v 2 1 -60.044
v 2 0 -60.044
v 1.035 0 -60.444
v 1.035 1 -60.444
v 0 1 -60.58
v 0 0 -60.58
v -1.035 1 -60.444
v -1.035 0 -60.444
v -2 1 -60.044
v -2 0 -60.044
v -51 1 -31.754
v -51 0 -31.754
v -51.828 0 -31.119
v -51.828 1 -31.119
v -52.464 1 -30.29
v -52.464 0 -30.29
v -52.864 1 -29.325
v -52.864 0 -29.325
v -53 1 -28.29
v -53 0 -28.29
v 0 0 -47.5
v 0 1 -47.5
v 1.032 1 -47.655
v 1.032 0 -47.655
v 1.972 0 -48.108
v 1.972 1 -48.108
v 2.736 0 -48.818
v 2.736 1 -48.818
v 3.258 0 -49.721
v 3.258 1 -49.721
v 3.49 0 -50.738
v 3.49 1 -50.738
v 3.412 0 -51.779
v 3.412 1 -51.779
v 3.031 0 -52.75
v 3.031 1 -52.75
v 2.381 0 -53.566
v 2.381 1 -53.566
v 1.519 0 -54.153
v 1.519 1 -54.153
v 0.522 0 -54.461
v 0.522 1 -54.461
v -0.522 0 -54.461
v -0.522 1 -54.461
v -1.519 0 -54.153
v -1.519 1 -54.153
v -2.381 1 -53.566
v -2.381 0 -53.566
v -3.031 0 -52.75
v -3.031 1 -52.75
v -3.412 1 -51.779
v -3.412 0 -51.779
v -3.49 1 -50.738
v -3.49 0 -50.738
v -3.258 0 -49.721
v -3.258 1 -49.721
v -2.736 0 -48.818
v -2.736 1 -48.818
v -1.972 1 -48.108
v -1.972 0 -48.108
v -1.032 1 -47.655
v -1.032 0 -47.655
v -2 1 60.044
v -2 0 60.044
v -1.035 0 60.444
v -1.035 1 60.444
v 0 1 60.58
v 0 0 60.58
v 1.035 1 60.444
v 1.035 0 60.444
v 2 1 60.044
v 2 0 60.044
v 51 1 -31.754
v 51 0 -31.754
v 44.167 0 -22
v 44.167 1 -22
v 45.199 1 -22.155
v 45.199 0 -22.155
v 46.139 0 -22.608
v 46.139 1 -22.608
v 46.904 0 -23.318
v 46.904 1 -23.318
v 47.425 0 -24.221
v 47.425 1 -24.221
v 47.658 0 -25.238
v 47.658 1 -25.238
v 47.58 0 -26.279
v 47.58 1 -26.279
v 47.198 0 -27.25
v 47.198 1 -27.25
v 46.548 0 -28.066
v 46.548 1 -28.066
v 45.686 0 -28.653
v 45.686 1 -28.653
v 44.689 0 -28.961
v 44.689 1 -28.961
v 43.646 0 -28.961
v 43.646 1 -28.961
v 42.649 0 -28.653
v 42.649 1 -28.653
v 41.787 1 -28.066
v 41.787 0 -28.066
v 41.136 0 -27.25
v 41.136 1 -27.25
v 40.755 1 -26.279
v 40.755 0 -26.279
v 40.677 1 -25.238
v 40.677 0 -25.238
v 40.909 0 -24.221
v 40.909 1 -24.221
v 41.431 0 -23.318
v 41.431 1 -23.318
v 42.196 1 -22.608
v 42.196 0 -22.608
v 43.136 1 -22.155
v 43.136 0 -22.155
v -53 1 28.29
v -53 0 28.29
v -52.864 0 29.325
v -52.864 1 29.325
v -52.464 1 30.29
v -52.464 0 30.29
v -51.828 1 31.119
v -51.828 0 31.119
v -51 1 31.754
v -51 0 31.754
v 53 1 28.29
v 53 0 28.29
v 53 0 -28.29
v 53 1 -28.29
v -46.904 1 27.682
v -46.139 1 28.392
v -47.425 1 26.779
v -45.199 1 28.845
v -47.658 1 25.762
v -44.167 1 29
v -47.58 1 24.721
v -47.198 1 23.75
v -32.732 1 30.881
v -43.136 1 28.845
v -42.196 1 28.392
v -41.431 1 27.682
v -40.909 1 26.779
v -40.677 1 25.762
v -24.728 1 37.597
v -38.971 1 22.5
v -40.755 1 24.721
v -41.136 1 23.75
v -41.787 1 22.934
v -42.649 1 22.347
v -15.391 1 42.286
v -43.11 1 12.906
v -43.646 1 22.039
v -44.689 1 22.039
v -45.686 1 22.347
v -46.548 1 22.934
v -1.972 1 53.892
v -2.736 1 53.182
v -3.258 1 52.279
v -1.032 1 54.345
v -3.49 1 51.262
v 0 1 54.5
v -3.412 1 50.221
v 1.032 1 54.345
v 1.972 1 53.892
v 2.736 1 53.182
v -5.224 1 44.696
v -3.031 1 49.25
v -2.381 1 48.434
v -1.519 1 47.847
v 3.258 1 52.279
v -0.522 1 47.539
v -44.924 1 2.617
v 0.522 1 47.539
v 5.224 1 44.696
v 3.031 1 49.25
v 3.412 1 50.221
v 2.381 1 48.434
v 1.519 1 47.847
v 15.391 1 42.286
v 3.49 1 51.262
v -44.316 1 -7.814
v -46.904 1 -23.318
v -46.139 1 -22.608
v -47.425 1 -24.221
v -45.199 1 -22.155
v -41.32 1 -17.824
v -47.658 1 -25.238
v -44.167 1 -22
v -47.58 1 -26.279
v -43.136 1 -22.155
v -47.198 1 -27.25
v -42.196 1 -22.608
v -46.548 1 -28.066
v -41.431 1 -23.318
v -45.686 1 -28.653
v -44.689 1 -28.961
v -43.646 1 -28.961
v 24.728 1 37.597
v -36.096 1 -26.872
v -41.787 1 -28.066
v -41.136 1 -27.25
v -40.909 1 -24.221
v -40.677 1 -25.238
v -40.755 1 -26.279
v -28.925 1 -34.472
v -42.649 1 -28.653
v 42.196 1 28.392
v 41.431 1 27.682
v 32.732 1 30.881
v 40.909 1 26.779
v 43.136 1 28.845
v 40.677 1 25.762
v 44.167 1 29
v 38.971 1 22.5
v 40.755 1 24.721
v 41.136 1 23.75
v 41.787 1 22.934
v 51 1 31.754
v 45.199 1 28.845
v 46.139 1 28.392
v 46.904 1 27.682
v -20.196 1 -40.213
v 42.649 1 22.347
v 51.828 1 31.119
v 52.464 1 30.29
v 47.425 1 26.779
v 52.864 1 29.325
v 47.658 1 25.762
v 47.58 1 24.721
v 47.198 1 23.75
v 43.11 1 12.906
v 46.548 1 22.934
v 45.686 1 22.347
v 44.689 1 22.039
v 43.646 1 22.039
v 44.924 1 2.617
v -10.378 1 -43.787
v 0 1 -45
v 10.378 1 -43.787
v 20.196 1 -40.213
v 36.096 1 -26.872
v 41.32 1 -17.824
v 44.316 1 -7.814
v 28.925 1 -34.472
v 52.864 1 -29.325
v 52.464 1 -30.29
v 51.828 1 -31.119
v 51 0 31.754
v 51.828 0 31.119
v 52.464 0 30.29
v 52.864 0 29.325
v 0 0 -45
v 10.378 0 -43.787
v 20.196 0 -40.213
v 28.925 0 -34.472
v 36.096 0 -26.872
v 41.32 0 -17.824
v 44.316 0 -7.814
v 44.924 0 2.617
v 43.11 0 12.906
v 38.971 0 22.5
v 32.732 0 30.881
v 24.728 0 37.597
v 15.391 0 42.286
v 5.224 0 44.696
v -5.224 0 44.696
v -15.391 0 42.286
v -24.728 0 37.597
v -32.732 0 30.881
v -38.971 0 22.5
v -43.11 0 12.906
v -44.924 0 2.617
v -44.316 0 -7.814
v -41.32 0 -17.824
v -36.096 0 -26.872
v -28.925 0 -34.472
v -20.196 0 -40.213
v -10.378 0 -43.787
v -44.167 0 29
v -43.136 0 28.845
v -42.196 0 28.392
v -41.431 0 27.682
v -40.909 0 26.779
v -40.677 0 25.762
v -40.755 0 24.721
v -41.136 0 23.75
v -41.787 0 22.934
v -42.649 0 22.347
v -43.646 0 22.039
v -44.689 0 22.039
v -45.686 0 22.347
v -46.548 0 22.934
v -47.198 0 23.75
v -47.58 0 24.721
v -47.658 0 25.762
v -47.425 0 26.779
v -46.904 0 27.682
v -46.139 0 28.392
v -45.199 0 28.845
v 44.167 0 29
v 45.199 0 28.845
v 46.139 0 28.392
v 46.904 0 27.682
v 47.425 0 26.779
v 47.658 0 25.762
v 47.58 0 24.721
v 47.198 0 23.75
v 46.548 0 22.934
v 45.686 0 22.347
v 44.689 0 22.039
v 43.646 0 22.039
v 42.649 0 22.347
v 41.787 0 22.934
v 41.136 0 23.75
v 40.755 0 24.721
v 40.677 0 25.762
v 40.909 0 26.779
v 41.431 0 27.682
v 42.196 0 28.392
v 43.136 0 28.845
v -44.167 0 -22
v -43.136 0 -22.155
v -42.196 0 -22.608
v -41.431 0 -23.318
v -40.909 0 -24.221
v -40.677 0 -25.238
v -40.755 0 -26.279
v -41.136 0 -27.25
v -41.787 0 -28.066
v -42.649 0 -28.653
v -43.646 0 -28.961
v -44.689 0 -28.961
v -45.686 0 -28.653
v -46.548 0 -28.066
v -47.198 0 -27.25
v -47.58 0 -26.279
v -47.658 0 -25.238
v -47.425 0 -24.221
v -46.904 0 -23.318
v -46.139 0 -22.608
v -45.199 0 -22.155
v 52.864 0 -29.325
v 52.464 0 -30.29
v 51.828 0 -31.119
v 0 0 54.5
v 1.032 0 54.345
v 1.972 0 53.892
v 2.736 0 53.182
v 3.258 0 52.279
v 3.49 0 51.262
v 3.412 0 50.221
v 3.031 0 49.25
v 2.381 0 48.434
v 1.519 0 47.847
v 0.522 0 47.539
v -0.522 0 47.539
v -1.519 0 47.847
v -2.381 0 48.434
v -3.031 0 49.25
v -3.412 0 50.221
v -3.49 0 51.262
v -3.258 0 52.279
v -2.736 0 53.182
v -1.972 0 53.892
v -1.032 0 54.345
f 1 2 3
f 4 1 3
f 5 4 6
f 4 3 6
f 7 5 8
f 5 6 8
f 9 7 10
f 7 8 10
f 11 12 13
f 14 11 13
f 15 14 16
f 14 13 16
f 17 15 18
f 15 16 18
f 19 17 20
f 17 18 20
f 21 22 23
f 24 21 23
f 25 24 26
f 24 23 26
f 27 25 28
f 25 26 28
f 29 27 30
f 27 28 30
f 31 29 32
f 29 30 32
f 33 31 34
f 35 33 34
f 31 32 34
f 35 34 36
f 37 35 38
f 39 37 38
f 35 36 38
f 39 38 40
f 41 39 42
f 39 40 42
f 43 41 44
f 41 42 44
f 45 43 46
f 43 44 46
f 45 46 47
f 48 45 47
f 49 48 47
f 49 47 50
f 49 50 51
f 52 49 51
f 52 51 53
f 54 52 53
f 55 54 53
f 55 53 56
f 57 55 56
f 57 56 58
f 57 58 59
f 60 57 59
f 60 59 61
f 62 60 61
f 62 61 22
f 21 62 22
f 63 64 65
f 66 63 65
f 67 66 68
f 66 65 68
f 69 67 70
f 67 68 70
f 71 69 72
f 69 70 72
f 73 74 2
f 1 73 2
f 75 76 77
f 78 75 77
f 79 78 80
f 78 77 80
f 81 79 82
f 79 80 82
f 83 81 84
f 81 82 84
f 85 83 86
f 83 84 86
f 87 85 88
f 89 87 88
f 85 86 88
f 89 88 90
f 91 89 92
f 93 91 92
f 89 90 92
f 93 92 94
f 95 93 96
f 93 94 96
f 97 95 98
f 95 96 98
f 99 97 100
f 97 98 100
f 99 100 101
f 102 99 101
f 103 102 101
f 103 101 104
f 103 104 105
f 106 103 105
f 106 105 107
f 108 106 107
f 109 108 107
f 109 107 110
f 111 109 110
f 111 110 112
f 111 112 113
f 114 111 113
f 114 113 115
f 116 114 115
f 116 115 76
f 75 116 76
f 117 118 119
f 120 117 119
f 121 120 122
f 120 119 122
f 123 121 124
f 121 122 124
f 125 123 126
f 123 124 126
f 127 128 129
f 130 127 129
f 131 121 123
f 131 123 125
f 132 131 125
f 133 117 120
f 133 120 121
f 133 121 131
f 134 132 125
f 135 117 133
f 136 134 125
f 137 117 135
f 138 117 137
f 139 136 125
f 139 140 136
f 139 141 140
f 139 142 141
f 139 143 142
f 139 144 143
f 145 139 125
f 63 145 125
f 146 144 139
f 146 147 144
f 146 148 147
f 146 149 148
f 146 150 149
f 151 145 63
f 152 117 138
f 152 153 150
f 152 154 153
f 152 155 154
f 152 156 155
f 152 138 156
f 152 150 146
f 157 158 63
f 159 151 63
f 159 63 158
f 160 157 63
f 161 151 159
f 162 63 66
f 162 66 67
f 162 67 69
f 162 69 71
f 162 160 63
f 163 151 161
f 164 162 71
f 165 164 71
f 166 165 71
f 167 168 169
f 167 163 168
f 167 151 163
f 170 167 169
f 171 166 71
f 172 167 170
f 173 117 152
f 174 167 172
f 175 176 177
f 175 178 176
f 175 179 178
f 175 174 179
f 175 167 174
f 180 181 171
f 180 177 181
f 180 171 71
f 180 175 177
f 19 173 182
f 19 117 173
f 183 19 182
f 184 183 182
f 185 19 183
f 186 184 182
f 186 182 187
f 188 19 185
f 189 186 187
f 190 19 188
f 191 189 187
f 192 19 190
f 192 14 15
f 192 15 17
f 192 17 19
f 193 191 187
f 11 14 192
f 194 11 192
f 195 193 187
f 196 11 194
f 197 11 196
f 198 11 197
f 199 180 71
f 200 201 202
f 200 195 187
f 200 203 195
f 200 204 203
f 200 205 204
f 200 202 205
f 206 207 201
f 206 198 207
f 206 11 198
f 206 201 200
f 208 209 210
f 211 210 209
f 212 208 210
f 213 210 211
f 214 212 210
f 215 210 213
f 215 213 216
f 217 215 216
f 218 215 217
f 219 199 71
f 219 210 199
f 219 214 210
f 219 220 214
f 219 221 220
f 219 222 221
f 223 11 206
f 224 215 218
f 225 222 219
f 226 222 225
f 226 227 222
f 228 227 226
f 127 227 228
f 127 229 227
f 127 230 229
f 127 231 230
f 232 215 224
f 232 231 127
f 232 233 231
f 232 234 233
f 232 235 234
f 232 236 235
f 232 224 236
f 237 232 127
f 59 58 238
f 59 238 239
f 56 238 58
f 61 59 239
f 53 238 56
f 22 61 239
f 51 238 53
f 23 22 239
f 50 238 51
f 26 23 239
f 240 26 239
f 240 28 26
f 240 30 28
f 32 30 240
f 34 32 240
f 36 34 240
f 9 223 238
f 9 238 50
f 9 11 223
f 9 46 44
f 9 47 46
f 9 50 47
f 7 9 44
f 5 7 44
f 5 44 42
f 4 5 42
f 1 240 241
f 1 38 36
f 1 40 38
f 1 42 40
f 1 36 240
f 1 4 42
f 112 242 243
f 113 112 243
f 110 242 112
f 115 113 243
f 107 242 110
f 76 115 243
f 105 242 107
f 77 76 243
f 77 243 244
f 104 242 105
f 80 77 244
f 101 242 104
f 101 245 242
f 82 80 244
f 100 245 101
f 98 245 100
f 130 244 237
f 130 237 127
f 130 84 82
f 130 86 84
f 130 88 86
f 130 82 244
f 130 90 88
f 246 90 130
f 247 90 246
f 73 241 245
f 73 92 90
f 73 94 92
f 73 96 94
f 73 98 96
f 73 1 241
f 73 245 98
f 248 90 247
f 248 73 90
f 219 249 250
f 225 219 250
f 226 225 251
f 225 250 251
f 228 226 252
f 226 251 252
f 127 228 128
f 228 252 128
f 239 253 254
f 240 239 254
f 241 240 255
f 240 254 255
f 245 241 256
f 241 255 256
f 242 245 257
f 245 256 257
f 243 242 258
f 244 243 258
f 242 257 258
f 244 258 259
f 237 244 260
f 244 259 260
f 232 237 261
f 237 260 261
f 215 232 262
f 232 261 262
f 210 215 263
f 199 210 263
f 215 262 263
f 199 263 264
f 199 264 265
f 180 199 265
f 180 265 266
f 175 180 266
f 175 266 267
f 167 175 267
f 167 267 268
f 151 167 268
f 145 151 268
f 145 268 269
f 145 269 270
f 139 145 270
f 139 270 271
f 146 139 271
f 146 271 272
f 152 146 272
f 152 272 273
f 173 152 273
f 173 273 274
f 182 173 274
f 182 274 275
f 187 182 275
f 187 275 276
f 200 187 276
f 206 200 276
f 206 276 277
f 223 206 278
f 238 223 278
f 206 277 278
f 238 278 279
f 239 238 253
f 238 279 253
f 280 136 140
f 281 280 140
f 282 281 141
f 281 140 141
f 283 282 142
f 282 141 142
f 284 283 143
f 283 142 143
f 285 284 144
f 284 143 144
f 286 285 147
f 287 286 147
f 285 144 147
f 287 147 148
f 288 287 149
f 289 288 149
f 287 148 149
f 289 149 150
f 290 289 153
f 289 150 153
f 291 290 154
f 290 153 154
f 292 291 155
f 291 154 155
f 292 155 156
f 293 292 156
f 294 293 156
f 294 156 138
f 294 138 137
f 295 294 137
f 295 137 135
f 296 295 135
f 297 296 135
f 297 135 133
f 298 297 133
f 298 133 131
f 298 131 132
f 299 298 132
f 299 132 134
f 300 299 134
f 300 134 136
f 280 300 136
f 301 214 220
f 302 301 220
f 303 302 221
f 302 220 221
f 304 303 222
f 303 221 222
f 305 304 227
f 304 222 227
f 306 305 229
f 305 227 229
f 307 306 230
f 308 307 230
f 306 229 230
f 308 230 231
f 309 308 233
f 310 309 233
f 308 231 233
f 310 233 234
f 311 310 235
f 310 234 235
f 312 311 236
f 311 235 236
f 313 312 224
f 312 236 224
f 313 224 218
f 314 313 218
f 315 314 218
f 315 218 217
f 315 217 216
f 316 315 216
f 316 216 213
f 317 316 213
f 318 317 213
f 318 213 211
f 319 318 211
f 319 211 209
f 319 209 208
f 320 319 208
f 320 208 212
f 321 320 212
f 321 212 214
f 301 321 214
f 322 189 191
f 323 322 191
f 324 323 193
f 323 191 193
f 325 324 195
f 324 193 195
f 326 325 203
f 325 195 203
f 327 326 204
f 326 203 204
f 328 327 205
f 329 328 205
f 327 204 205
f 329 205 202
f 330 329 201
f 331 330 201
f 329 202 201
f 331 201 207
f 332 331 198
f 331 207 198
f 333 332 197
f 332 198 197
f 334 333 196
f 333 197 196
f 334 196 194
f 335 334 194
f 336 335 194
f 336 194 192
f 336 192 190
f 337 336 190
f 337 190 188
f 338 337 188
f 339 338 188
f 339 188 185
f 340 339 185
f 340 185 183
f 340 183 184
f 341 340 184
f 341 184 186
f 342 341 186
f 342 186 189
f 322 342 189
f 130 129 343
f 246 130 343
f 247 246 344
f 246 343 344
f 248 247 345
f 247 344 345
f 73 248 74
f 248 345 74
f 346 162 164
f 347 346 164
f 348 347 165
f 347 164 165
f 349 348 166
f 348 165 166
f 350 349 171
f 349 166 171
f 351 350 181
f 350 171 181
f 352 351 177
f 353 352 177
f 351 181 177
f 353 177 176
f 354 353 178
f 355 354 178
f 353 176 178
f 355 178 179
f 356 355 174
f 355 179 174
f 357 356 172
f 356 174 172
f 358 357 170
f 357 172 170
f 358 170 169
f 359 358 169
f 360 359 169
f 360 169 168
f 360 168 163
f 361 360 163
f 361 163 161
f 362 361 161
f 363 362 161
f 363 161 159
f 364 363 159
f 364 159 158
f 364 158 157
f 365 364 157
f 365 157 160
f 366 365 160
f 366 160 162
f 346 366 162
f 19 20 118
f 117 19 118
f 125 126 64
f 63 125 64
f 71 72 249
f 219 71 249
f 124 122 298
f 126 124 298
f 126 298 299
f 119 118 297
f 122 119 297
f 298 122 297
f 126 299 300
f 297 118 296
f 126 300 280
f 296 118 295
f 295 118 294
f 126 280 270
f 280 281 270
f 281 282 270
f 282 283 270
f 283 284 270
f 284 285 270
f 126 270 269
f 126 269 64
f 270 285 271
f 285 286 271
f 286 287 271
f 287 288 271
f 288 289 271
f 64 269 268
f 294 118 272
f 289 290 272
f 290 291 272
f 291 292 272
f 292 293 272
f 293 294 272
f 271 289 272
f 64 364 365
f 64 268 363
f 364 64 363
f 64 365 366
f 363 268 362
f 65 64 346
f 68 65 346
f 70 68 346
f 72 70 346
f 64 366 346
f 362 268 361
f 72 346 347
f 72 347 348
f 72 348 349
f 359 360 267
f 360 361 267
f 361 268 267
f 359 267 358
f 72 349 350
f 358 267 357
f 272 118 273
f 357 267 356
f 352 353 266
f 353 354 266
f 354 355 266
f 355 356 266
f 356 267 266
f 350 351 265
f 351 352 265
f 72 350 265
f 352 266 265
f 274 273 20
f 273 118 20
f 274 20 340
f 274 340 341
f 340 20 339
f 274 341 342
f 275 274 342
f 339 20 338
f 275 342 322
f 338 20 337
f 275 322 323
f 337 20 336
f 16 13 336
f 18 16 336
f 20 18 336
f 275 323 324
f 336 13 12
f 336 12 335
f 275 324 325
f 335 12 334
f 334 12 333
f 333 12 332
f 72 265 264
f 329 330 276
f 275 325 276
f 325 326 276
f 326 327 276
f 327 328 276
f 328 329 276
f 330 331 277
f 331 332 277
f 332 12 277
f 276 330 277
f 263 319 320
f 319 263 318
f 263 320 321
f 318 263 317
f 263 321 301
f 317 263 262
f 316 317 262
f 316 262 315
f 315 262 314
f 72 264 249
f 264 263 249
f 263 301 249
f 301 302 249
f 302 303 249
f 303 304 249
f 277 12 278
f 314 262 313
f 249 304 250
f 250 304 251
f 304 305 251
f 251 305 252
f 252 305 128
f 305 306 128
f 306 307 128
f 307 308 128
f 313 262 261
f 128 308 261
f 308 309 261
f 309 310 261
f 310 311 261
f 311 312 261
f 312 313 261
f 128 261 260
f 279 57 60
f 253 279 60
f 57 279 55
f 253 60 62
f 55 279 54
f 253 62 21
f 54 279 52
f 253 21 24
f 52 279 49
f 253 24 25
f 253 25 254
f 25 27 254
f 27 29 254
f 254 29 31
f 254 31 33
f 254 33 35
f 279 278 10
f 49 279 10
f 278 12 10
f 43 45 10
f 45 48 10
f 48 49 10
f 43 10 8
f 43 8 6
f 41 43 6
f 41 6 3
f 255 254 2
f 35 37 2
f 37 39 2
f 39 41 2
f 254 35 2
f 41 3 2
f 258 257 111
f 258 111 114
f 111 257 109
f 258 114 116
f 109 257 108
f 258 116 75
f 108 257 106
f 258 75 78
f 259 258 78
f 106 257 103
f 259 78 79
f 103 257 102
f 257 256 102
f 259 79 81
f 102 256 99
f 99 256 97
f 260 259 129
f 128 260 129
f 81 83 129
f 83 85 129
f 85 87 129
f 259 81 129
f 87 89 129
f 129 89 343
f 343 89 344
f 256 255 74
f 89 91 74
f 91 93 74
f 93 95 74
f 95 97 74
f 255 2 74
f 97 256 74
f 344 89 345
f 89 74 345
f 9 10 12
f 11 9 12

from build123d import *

# Parameters (mm, degrees)
BOSS_EXTRUDE1_DEPTH = 1
SKETCH2_R           = 3.5
CUT_EXTRUDE1_DEPTH  = 81.498297773
SKETCH3_R           = 45
CUT_EXTRUDE2_DEPTH  = 81.498297773


with BuildPart() as part:
    # Sketch1 → Boss-Extrude1 (new body)
    with BuildSketch(Plane(origin=(0, 0, 0), x_dir=(1, 0, 0), z_dir=(0, 1, 0))):
        with BuildLine():
            Line((2, -60.044427996), (51, -31.754264805))
            ThreePointArc((51, -31.754264805), (52.464101615, -30.29016319), (53, -28.29016319))
            Line((53, -28.29016319), (53, 28.29016319))
            ThreePointArc((53, 28.29016319), (52.464101615, 30.29016319), (51, 31.754264805))
            Line((51, 31.754264805), (2, 60.044427996))
            ThreePointArc((2, 60.044427996), (0, 60.580326381), (-2, 60.044427996))
            Line((-2, 60.044427996), (-51, 31.754264805))
            ThreePointArc((-51, 31.754264805), (-52.464101615, 30.29016319), (-53, 28.29016319))
            Line((-53, 28.29016319), (-53, -28.29016319))
            ThreePointArc((-53, -28.29016319), (-52.464101615, -30.29016319), (-51, -31.754264805))
            Line((-51, -31.754264805), (-2, -60.044427996))
            ThreePointArc((-2, -60.044427996), (0, -60.580326381), (2, -60.044427996))
        make_face()
    extrude(amount=BOSS_EXTRUDE1_DEPTH)

    # Sketch2 → Cut-Extrude1 (cut, through all)
    with BuildSketch(Plane(origin=(0, 1, 0), x_dir=(1, 0, 0), z_dir=(0, 1, 0))):
        with Locations(Location((0, 51, 0), (0, 0, 270))):
            Circle(SKETCH2_R)
        with Locations(Location((44.167295593, 25.5, 0), (0, 0, 270))):
            Circle(SKETCH2_R)
        with Locations(Location((44.167295593, -25.5, 0), (0, 0, 270))):
            Circle(SKETCH2_R)
        with Locations(Location((0, -51, 0), (0, 0, 270))):
            Circle(SKETCH2_R)
        with Locations(Location((-44.167295593, -25.5, 0), (0, 0, 270))):
            Circle(SKETCH2_R)
        with Locations(Location((-44.167295593, 25.5, 0), (0, 0, 270))):
            Circle(SKETCH2_R)
    extrude(amount=-CUT_EXTRUDE1_DEPTH, mode=Mode.SUBTRACT)

    # Sketch3 → Cut-Extrude2 (cut, through all)
    with BuildSketch(Plane.XZ):
        with Locations(Location((0, 0, 0), (0, 0, 270))):
            Circle(SKETCH3_R)
    extrude(amount=-CUT_EXTRUDE2_DEPTH, mode=Mode.SUBTRACT)


solid = part.part
